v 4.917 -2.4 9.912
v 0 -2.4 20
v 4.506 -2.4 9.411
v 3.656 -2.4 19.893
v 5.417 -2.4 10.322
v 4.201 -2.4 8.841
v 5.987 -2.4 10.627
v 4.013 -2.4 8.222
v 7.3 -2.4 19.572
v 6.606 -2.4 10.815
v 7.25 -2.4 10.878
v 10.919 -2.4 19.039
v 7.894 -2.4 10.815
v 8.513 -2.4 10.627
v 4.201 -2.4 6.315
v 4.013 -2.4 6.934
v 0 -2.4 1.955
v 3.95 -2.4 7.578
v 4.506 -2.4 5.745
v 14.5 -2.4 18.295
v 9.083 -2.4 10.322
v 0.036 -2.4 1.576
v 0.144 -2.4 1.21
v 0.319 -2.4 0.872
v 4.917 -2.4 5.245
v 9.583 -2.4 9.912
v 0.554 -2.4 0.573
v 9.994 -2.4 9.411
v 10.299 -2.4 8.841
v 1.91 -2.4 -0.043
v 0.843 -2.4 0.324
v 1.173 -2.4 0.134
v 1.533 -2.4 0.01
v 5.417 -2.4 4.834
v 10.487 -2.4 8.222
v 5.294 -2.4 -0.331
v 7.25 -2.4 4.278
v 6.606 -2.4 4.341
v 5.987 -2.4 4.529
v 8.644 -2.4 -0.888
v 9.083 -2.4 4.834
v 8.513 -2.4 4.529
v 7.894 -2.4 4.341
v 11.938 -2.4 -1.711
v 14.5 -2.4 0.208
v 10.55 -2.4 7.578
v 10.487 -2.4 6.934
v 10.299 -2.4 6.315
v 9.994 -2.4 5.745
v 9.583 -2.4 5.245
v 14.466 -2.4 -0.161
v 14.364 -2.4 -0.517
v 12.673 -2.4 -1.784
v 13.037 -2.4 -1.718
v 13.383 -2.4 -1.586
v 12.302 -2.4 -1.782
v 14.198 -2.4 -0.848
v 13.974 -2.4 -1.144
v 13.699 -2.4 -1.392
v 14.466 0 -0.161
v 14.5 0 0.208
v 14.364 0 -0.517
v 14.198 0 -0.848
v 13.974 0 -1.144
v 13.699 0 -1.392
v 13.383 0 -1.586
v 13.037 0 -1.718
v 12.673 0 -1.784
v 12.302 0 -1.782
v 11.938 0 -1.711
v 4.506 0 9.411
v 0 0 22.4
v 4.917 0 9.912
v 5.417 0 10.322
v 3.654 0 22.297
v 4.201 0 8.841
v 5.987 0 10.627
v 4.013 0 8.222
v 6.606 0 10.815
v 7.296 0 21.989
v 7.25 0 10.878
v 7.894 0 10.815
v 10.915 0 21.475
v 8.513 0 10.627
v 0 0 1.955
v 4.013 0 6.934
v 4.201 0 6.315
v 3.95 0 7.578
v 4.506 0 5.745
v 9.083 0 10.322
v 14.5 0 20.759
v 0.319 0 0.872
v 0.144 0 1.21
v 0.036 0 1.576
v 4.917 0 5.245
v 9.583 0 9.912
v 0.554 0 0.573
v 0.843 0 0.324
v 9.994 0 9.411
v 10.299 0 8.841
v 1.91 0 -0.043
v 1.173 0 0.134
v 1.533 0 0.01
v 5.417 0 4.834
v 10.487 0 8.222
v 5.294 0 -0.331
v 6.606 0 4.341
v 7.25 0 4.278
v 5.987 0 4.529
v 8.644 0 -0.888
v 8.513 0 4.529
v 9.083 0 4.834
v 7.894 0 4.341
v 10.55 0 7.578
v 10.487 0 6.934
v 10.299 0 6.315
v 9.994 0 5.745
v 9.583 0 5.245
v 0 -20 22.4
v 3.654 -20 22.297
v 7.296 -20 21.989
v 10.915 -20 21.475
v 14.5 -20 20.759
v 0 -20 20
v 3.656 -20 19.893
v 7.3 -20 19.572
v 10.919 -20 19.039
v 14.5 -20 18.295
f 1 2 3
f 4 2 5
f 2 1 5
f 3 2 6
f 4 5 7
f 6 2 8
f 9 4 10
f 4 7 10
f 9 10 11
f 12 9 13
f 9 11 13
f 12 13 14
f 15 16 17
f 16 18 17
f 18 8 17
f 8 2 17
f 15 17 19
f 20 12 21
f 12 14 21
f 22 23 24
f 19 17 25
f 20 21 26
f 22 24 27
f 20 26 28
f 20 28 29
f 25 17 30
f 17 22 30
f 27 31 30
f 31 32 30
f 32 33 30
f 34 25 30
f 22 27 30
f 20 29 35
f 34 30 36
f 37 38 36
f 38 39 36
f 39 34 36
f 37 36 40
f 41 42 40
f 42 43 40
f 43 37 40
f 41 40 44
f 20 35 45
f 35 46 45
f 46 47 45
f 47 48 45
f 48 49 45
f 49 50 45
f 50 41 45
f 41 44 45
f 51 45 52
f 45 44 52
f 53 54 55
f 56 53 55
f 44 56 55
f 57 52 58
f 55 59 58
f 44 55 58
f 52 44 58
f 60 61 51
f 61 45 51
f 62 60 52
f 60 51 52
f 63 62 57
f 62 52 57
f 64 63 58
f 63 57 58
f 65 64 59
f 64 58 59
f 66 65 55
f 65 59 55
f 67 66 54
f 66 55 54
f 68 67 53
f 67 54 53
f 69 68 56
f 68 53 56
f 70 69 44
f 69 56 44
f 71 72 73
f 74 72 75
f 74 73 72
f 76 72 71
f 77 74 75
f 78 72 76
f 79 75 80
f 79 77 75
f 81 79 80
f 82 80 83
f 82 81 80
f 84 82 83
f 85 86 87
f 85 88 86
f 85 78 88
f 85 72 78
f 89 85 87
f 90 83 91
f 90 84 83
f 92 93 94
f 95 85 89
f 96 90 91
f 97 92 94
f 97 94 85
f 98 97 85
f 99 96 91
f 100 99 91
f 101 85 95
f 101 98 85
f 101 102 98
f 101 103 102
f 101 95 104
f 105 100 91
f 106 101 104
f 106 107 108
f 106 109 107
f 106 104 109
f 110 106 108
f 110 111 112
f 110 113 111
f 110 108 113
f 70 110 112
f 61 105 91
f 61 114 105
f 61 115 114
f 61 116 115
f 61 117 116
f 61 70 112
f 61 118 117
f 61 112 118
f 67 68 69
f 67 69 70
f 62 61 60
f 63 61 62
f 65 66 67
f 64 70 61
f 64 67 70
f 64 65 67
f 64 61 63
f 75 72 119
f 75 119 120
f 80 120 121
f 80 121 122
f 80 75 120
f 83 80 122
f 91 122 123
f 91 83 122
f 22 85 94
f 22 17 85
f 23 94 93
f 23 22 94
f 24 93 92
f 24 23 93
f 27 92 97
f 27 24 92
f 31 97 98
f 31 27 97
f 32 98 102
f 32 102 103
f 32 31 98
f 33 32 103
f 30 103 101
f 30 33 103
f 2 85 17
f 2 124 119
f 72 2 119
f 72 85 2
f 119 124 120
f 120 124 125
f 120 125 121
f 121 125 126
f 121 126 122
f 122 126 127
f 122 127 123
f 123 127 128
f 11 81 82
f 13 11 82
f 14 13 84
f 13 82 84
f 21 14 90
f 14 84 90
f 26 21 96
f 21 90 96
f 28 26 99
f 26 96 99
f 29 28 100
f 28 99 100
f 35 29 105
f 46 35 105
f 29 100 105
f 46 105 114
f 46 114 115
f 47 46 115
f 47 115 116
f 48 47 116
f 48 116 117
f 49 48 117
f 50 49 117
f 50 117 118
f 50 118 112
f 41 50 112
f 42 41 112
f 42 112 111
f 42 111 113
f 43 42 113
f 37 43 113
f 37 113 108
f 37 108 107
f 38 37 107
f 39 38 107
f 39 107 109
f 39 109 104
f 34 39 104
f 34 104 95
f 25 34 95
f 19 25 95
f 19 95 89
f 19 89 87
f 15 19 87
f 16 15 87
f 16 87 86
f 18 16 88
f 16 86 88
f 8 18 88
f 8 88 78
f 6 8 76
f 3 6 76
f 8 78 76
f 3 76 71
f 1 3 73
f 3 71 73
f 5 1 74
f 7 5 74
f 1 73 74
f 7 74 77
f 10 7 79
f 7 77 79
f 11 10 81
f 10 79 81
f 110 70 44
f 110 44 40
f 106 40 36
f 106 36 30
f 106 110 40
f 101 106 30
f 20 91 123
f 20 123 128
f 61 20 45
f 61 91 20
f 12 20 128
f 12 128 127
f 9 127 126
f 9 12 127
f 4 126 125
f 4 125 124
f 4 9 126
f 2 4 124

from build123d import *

# Parameters (mm, degrees)
BOSS_EXTRUDE1_DEPTH = 2.4
BOSS_EXTRUDE3_DEPTH = 20
FILLET2_R           = 2
SKETCH7_R           = 3.3
CUT_EXTRUDE1_DEPTH  = 34.346813941


with BuildPart() as part:
    # Sketch4 → Boss-Extrude1 (new body)
    with BuildSketch(Plane(origin=(0, 0, 0), x_dir=(1, 0, 0), z_dir=(0, 1, 0))):
        with BuildLine():
            Line((0, 0), (0, -20))
            ThreePointArc((0, -20), (7.299964439, -19.572220189), (14.5, -18.294736614))
            Line((14.5, -18.294736614), (14.5, 2.550031289))
            ThreePointArc((14.5, 2.550031289), (7.361261094, 0.642362285), (0, 0))
        make_face()
    extrude(amount=-BOSS_EXTRUDE1_DEPTH)

    # Sketch6 → Boss-Extrude3 (add)
    with BuildSketch(Plane(origin=(0, 0, 0), x_dir=(1, 0, 0), z_dir=(0, 1, 0))):
        with BuildLine():
            Line((0, -20), (0, -22.4))
            ThreePointArc((0, -22.4), (7.296255081, -21.988562256), (14.5, -20.759465695))
            Line((14.5, -20.759465695), (14.5, -18.294736614))
            ThreePointArc((14.5, -18.294736614), (7.299964439, -19.572220189), (0, -20))
        make_face()
    extrude(amount=-BOSS_EXTRUDE3_DEPTH)

    # Fillet2
    fillet2_edges = [part.edges().sort_by_distance(p)[0] for p in [
        (14.5, -1.2, -2.550031289),
        (0, -1.2, 0),
    ]]
    fillet(fillet2_edges, radius=FILLET2_R)

    # Sketch7 → Cut-Extrude1 (cut, through all)
    with BuildSketch(Plane(origin=(0, 0, 0), x_dir=(1, 0, 0), z_dir=(0, 1, 0))):
        with Locations(Location((7.25, -7.57807584, 0), (0, 0, 270))):
            Circle(SKETCH7_R)
    extrude(amount=-CUT_EXTRUDE1_DEPTH, mode=Mode.SUBTRACT)


solid = part.part
